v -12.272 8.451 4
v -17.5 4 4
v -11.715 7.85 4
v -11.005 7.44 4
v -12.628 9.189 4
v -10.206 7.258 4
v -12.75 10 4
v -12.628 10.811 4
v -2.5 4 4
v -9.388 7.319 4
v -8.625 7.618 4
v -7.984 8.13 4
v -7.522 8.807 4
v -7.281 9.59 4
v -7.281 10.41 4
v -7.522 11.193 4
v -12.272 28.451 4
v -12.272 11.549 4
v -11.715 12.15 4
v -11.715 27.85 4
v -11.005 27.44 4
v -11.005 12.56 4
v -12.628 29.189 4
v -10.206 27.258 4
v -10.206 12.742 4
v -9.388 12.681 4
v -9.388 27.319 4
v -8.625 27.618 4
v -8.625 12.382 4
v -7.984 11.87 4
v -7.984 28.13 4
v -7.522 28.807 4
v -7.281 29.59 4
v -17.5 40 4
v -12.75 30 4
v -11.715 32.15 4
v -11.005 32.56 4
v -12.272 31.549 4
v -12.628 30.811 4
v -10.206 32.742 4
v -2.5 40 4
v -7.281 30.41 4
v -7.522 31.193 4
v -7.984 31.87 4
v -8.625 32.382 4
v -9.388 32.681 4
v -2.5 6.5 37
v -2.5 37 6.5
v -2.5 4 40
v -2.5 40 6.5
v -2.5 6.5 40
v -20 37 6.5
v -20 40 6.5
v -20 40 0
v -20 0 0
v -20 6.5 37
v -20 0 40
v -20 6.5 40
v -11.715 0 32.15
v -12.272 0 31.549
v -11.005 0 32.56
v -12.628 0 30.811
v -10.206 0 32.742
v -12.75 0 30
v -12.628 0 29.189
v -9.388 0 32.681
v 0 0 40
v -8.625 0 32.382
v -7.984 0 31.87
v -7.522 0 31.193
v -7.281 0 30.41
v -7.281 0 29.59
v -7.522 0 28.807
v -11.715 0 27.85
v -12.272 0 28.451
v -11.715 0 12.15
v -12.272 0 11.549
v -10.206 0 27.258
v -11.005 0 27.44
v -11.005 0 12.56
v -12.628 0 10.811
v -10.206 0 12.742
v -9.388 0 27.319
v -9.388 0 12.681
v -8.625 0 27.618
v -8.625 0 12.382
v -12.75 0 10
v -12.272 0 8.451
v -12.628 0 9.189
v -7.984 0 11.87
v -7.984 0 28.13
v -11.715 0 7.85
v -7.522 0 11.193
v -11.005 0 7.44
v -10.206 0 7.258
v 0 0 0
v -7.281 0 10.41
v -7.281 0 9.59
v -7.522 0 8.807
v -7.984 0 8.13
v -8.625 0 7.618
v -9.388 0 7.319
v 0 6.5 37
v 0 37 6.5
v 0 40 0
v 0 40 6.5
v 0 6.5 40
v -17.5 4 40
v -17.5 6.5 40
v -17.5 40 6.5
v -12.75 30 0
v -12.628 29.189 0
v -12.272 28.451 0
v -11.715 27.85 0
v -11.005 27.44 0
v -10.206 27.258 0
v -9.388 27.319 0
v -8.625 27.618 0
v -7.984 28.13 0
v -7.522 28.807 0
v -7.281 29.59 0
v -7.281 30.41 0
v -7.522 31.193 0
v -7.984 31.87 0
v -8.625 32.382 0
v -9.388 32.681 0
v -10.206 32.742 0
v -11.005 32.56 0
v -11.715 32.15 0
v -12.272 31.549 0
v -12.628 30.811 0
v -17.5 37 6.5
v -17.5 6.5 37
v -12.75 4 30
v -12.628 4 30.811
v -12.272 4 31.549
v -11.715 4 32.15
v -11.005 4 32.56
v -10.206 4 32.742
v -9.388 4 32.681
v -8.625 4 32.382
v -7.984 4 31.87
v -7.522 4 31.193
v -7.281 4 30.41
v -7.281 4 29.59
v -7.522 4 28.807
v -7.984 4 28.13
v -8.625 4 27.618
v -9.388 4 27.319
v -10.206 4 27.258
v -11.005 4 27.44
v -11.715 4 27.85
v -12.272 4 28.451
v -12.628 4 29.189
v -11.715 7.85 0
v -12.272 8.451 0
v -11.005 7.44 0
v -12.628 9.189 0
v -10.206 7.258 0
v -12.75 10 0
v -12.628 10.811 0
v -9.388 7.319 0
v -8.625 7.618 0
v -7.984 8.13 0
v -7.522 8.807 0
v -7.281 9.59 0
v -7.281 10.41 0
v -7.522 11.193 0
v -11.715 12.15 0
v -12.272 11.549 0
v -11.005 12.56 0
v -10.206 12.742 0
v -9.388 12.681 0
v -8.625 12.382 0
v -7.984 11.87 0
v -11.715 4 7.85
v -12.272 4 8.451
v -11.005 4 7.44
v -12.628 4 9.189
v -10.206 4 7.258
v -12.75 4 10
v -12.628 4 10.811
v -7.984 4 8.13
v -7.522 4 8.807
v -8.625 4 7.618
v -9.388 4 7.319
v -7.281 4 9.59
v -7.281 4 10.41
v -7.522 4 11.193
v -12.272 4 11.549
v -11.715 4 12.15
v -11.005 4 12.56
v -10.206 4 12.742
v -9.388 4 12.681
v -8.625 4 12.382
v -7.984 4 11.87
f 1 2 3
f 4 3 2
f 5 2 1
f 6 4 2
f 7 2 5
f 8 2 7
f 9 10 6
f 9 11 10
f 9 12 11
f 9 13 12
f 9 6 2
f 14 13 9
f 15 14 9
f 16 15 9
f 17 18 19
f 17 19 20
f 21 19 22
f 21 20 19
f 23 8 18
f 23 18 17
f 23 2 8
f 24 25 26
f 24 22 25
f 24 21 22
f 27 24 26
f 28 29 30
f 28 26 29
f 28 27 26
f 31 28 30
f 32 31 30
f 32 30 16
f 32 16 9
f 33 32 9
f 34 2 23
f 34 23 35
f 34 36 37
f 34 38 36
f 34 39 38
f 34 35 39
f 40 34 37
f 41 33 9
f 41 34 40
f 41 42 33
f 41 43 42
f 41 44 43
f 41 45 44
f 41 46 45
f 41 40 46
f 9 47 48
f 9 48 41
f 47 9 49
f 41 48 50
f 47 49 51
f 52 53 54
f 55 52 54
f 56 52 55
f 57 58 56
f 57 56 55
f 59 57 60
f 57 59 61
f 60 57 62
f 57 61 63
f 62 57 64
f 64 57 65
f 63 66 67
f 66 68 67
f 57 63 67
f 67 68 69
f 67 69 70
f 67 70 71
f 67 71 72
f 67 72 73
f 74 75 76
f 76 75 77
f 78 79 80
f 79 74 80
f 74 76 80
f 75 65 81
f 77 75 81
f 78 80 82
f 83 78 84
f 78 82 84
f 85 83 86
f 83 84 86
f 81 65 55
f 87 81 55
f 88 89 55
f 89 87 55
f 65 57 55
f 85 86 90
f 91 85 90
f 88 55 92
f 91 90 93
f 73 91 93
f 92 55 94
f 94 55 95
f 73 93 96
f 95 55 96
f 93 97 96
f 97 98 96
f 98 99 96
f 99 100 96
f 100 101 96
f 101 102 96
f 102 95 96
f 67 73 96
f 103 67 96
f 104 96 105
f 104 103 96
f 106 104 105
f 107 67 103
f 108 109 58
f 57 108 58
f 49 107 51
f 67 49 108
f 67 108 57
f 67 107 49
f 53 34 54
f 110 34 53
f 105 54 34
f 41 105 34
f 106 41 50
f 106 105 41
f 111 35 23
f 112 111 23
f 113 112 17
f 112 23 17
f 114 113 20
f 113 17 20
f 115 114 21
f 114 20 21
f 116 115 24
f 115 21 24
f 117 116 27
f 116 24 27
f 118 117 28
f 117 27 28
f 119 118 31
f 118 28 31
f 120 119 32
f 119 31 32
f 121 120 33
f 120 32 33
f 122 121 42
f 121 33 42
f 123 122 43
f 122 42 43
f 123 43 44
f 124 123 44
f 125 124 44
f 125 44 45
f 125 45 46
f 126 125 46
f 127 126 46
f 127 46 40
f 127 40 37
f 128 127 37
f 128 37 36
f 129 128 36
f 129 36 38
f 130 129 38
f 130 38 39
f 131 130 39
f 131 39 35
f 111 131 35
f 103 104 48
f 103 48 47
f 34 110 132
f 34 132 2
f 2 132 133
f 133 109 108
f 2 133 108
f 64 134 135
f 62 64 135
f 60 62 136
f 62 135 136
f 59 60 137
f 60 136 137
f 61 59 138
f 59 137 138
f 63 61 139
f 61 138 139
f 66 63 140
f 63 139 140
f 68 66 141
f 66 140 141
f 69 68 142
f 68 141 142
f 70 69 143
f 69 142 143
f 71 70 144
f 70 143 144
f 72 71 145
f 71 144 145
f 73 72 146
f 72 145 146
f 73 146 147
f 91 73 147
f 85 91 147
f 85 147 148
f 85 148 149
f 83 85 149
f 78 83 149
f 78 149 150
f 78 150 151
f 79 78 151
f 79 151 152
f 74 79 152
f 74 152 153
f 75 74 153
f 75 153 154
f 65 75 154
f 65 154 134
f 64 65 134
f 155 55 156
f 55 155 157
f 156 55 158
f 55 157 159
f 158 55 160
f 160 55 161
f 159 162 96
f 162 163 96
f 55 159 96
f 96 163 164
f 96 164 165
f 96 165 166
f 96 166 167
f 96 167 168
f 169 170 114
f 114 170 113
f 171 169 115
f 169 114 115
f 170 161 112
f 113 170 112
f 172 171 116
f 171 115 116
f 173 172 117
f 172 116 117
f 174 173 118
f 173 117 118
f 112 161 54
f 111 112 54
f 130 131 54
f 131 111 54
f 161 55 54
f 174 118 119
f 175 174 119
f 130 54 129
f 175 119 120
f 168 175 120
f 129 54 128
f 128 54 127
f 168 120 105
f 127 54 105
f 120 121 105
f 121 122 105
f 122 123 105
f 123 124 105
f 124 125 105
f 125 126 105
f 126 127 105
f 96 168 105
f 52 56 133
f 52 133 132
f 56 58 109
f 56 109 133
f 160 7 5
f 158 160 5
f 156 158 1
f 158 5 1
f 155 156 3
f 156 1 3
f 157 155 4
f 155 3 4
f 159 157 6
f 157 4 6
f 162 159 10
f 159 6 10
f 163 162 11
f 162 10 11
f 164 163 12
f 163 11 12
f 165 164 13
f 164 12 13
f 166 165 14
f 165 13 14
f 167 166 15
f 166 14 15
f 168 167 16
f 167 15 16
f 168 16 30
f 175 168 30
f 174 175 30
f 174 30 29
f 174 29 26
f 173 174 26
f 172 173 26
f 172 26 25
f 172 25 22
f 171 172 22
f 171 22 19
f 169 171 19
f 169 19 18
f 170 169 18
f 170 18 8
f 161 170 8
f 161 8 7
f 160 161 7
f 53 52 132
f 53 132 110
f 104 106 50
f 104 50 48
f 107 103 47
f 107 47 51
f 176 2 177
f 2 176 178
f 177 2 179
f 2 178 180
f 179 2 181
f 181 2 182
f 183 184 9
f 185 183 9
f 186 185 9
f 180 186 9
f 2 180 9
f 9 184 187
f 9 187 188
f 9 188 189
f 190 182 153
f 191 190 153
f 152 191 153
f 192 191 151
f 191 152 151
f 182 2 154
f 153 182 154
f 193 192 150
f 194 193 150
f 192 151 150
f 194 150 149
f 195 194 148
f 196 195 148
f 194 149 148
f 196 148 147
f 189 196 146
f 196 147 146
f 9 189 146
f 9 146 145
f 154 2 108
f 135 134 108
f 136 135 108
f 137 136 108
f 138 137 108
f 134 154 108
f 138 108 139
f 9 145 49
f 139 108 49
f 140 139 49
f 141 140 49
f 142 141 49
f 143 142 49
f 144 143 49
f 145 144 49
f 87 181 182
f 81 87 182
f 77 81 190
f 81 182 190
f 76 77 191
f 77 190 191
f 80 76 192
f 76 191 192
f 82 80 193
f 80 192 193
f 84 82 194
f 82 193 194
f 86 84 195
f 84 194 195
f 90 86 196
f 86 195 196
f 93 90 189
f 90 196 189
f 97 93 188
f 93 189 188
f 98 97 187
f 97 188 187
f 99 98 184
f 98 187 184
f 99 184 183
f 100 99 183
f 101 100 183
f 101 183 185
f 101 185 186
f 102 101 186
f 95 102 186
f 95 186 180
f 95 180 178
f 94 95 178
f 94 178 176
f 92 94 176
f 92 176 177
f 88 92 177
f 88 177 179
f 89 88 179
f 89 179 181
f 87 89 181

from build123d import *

# Parameters (mm, degrees)
F0_W     = 20
F0_H     = 40
F1_DEPTH = 4
F2_W     = 20
F2_H     = 40
F3_DEPTH = 4
F7_DEPTH = 2.5
F8_DEPTH = 2.5
F9_D     = 5.5
F11_D    = 5.5


with BuildPart() as f1:
    # F0 (on Top) → F1 (new body)
    with BuildSketch(Plane.XY):
        with Locations((-10, 20)):
            Rectangle(F0_W, F0_H)
    extrude(amount=F1_DEPTH)

    # F2 (on Front) → F3 (join)
    with BuildSketch(Plane.XZ):
        with Locations((-10, 20)):
            Rectangle(F2_W, F2_H)
    extrude(amount=-F3_DEPTH)

    # F6 (on face) → F7 (join)
    with BuildSketch(Plane(origin=(-20, 0, 0), x_dir=(0, -1, 0), z_dir=(-1, 0, 0))):
        Polygon((-4, 4), (-4, 40), (-6.5, 40), (-6.5, 37), (-37, 6.5), (-40, 6.5), (-40, 4), align=None)
    extrude(amount=-F7_DEPTH)

    # F5 (on face) → F8 (join)
    with BuildSketch(Plane.YZ):
        Polygon((4, 4), (40, 4), (40, 6.5), (37, 6.5), (6.5, 37), (6.5, 40), (4, 40), align=None)
    extrude(amount=-F8_DEPTH)

    # F9 (through all)
    with Locations(Plane.XZ):
        with Locations((-10, 30), (-10, 10)):
            Hole(F9_D / 2)

    # F11 (through all)
    with Locations(Plane(origin=(0, 0, 0), x_dir=(1, 0, 0), z_dir=(0, 0, -1))):
        with Locations((-10, -30), (-10, -10)):
            Hole(F11_D / 2)


solid = f1.part
